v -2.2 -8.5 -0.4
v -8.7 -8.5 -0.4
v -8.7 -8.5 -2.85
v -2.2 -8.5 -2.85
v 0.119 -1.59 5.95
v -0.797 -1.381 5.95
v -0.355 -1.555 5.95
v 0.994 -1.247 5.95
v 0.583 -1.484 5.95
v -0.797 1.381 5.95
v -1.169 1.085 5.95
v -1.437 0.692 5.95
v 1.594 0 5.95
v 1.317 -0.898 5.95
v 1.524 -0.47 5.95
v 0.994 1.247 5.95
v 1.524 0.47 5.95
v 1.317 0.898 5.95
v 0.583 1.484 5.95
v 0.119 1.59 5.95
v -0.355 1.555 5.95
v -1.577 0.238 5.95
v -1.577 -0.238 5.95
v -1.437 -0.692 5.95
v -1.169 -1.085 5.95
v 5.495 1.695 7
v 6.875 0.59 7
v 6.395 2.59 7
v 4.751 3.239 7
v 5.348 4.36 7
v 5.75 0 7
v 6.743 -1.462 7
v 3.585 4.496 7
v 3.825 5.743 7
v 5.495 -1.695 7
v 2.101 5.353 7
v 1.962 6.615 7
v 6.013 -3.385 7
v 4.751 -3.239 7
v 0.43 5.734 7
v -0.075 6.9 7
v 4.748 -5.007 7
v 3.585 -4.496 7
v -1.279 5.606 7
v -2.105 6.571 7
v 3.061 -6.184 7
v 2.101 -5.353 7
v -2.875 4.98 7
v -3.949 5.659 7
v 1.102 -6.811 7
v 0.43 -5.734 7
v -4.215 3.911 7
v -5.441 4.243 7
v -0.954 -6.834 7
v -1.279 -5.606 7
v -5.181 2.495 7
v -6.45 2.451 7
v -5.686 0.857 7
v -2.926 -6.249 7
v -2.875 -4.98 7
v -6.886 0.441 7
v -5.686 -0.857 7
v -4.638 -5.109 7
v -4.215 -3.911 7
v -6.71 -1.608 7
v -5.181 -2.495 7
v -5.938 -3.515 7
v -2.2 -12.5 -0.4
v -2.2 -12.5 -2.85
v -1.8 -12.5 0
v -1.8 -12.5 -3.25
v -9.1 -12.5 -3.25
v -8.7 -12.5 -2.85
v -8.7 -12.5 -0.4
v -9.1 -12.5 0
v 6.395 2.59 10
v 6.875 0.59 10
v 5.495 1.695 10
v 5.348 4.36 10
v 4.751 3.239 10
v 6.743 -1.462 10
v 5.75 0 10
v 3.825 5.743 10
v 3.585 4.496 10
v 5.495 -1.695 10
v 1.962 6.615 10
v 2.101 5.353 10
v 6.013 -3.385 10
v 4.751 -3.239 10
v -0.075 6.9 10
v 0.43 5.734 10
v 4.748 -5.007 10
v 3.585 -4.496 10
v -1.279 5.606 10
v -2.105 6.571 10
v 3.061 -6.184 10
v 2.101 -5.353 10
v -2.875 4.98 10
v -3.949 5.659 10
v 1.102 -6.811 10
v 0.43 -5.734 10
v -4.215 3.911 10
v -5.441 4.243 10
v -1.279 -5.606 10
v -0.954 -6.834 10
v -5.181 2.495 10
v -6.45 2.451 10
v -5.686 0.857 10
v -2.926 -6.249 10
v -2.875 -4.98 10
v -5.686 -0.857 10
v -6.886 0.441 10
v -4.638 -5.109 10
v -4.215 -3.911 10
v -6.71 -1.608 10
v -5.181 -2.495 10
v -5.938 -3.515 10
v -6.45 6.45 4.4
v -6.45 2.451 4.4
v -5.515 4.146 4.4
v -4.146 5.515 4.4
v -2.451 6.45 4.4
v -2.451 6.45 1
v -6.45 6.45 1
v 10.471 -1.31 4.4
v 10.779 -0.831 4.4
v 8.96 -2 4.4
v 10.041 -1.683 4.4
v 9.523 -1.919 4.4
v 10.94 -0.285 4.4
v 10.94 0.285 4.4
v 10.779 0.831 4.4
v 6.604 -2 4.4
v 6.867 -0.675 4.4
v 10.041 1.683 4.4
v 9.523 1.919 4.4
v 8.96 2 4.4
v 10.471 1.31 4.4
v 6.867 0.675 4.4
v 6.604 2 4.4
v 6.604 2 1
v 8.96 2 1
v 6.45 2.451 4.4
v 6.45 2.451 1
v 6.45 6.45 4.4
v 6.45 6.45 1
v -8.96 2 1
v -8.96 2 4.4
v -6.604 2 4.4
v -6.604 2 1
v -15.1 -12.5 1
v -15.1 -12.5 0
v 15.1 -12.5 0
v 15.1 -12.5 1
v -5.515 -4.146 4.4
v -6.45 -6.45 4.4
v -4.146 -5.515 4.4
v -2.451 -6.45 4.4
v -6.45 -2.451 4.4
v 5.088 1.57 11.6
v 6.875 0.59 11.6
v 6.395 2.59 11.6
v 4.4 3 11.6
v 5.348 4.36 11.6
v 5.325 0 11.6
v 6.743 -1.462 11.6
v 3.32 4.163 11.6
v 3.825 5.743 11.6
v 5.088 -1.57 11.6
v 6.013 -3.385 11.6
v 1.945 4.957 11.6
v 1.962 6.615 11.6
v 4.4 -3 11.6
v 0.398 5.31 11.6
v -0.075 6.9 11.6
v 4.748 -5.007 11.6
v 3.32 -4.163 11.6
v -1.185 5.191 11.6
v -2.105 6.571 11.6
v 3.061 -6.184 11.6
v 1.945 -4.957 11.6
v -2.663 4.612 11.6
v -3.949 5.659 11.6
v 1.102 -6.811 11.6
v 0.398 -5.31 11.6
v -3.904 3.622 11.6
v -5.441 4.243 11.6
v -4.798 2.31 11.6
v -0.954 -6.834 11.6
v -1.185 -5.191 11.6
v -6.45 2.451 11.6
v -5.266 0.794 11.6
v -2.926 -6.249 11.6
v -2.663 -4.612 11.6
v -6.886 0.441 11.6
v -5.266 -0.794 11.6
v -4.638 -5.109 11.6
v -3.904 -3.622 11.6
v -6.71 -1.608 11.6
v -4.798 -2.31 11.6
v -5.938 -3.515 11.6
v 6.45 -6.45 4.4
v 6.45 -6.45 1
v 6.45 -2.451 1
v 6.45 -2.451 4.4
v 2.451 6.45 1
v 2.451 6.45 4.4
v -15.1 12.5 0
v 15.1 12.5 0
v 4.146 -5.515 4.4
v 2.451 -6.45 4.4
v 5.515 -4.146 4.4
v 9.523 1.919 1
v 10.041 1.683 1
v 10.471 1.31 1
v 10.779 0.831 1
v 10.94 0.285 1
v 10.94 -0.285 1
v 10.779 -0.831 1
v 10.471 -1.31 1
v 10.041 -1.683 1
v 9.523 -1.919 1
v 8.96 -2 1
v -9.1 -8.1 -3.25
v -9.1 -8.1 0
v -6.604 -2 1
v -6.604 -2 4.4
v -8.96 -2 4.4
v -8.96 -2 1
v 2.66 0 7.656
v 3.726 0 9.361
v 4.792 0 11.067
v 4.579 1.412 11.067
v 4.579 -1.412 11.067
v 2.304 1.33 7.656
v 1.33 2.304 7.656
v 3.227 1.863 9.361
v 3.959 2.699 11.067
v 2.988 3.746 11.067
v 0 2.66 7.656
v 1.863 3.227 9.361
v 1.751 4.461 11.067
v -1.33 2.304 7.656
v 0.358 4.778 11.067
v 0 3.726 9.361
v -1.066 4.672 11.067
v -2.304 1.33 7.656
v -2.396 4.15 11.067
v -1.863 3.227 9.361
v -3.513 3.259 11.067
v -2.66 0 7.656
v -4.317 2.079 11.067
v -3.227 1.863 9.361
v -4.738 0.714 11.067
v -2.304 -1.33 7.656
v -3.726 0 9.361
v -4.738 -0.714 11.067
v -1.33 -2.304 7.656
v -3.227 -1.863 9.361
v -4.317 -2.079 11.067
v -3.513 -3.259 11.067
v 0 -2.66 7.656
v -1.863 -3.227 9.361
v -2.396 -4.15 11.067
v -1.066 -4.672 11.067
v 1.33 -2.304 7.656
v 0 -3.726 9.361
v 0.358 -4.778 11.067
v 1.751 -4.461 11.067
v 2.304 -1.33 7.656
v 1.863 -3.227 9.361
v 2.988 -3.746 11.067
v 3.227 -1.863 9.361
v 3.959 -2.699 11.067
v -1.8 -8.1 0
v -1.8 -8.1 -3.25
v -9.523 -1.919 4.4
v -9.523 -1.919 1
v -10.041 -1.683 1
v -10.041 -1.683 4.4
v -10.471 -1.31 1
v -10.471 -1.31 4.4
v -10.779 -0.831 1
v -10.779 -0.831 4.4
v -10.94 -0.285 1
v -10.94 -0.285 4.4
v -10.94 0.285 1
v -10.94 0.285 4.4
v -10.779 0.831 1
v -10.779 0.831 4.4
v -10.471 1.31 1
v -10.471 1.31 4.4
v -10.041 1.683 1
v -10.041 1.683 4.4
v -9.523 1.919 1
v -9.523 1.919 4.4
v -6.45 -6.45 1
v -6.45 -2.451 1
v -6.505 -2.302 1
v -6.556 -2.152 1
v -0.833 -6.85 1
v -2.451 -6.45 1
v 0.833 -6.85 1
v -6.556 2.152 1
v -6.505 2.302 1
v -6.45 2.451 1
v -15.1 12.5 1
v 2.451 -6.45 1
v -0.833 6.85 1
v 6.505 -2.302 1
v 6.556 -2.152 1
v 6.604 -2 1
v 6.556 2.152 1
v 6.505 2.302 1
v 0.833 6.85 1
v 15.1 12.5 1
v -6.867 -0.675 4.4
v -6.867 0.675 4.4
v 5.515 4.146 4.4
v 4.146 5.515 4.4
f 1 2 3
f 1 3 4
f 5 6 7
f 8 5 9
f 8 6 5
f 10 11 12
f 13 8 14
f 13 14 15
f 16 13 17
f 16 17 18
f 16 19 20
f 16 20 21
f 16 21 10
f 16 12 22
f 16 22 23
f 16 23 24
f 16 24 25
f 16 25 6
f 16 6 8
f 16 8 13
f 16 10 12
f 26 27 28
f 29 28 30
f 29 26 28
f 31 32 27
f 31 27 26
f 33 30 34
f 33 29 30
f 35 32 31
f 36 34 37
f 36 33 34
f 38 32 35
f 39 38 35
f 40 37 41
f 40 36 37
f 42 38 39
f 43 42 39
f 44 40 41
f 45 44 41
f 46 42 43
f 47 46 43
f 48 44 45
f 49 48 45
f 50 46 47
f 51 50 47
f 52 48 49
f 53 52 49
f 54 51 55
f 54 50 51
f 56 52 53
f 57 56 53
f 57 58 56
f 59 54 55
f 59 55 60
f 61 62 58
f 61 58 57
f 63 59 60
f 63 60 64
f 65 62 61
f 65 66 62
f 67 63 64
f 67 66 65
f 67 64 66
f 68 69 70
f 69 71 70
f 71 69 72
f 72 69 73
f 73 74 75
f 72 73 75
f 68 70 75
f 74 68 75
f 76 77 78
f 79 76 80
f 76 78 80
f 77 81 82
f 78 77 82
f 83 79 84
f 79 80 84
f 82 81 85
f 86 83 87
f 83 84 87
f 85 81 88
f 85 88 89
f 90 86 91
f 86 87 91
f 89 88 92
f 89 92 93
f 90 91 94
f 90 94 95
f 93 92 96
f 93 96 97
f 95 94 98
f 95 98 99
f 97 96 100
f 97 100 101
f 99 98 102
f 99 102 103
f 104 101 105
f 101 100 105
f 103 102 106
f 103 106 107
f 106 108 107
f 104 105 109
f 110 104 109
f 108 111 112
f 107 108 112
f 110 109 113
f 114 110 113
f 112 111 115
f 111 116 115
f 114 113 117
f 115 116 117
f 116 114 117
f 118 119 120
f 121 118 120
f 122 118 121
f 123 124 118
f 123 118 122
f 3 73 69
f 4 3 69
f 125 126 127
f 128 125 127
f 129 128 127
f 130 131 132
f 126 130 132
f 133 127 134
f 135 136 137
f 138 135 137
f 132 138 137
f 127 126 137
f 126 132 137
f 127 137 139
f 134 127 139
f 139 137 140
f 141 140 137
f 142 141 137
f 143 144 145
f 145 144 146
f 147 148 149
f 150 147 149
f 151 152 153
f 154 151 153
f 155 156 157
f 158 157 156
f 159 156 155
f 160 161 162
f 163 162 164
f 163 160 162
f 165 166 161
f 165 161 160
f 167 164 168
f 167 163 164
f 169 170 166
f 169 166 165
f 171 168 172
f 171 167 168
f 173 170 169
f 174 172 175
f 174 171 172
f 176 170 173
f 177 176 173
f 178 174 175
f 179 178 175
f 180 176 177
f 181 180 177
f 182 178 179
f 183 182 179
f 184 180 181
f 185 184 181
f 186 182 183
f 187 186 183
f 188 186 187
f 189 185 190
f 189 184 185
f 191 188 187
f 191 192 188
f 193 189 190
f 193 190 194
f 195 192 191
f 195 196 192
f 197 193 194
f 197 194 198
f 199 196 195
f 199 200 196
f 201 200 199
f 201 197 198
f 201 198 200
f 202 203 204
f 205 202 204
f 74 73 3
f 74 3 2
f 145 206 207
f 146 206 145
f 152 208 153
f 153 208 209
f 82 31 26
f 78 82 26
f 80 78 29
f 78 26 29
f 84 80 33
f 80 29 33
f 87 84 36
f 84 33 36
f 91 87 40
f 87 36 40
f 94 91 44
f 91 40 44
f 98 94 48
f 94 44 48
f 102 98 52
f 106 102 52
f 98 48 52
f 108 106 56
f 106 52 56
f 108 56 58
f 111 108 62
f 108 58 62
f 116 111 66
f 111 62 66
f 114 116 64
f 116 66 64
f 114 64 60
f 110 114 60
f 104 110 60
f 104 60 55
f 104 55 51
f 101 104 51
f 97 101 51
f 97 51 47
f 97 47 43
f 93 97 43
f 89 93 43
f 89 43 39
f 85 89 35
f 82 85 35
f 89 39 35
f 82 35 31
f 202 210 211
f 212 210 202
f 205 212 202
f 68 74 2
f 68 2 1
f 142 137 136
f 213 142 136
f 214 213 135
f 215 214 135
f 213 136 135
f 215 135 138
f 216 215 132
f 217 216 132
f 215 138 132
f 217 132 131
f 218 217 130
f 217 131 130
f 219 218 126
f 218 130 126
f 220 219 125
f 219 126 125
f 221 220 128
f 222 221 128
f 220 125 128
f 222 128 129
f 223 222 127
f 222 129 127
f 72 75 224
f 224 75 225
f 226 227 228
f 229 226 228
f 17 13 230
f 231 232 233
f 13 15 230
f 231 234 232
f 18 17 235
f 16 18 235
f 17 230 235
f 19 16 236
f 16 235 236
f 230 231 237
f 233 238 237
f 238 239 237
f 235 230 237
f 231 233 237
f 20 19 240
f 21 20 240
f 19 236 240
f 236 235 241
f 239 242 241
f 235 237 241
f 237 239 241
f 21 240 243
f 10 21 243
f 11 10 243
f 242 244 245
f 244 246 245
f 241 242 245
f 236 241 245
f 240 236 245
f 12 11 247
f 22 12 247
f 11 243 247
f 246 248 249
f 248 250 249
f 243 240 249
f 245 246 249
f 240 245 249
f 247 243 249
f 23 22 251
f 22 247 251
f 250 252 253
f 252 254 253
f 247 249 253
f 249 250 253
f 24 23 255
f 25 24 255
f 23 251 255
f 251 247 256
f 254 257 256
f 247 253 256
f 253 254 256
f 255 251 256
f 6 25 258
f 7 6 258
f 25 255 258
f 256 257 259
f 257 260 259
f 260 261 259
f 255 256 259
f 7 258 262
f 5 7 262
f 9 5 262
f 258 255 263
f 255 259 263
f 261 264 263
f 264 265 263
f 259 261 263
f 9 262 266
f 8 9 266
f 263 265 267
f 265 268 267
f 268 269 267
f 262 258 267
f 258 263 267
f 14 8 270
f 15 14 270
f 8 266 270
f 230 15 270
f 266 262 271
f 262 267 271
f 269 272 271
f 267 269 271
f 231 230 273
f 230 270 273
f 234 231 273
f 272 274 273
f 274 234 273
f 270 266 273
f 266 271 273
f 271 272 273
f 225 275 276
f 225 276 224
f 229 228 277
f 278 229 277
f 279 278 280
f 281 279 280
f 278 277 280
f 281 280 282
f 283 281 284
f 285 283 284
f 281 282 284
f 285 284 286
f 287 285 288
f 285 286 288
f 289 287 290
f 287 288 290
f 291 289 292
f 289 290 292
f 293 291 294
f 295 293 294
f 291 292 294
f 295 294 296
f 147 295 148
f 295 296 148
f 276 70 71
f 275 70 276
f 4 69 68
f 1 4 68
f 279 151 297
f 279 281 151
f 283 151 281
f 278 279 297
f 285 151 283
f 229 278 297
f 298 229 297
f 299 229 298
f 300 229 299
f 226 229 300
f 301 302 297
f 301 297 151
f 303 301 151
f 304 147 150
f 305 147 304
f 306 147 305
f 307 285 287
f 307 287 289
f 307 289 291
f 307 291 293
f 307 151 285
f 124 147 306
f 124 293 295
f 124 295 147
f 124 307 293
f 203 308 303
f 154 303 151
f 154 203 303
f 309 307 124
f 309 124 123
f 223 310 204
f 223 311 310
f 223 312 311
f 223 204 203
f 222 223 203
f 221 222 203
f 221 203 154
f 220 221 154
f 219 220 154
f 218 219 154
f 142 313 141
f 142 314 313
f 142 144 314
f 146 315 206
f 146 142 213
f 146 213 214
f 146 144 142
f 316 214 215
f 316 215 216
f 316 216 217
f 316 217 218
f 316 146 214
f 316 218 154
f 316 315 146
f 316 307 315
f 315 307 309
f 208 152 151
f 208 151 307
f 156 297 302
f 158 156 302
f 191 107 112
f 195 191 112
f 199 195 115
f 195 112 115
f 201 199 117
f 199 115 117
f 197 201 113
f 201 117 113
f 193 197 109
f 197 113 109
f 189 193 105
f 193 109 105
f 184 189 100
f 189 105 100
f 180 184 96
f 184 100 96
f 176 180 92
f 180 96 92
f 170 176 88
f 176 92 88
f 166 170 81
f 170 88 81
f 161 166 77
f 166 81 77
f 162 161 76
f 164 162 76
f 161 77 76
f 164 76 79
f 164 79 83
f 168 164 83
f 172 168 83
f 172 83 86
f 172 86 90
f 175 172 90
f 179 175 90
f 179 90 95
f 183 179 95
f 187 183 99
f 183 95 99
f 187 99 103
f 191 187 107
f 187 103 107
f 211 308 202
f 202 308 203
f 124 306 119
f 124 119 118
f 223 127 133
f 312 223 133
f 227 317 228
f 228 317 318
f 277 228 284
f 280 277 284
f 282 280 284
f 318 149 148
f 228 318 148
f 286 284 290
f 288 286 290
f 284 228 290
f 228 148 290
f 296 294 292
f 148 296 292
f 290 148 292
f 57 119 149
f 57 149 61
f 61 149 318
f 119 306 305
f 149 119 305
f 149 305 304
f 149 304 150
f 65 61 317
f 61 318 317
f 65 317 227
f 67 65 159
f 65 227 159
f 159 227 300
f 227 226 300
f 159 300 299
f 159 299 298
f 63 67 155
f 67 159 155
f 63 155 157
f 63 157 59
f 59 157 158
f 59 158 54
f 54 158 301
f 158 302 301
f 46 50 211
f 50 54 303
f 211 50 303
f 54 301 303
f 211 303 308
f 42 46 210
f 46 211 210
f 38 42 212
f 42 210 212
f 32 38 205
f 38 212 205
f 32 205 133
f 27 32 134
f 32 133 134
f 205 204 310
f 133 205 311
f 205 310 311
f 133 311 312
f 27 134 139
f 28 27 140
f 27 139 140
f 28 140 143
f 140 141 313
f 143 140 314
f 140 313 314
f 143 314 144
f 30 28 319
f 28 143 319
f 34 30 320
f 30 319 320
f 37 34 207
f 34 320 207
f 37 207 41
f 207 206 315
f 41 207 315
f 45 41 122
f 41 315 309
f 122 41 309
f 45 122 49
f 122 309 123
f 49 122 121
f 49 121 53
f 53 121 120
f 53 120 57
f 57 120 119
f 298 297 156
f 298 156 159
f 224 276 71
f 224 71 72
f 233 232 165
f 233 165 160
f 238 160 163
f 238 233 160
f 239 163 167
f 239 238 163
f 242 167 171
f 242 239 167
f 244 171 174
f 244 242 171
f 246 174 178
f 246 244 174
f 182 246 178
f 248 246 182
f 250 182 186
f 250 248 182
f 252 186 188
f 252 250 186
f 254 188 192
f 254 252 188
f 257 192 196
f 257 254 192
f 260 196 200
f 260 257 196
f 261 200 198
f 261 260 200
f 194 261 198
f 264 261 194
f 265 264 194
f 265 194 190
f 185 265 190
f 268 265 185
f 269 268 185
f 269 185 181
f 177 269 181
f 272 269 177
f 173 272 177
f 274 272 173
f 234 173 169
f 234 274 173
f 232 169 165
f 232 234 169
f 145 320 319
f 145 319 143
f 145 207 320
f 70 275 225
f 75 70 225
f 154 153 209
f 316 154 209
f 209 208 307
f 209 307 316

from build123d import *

# Parameters (mm, degrees)
SKETCH1_W           = 30.2
SKETCH1_H           = 25
BOSS_EXTRUDE1_DEPTH = 1
SKETCH2_W           = 12.9
SKETCH2_H           = 12.9
BOSS_EXTRUDE2_DEPTH = 3.4
SKETCH3_R           = 6.9
BOSS_EXTRUDE3_DEPTH = 6
SKETCH4_R           = 5.75
BOSS_EXTRUDE4_DEPTH = 3
SKETCH5_R           = 6.9
BOSS_EXTRUDE5_DEPTH = 1.6
SKETCH6_R           = 5.125
CUT_EXTRUDE1_DEPTH  = 5.65
CUT_EXTRUDE1_DRAFT  = -32
CHAMFER1_SIZE       = 0.2
CHAMFER1_SIZE2      = 0.628676121
SKETCH7_W           = 7.3
SKETCH7_H           = 4.4
BOSS_EXTRUDE6_DEPTH = 3.25
SKETCH8_W           = 6.5
SKETCH8_H           = 2.45
CUT_EXTRUDE2_DEPTH  = 4
BOSS_EXTRUDE7_DEPTH = 3.4


with BuildPart() as part:
    # Sketch1 → Boss-Extrude1 (new body)
    with BuildSketch(Plane.XY):
        Rectangle(SKETCH1_W, SKETCH1_H)
    extrude(amount=BOSS_EXTRUDE1_DEPTH)

    # Sketch2 → Boss-Extrude2 (add)
    with BuildSketch(Plane.XY.offset(1)):
        Rectangle(SKETCH2_W, SKETCH2_H)
    extrude(amount=BOSS_EXTRUDE2_DEPTH)

    # Sketch3 → Boss-Extrude3 (add)
    with BuildSketch(Plane.XY.offset(1)):
        with Locations(Location((0, 0, 0), (0, 0, 159.193052224))):
            Circle(SKETCH3_R)
    extrude(amount=BOSS_EXTRUDE3_DEPTH)

    # Sketch4 → Boss-Extrude4 (add)
    with BuildSketch(Plane.XY.offset(7)):
        Circle(SKETCH4_R)
    extrude(amount=BOSS_EXTRUDE4_DEPTH)

    # Sketch5 → Boss-Extrude5 (add)
    with BuildSketch(Plane.XY.offset(10)):
        with Locations(Location((0, 0, 0), (0, 0, 159.193052224))):
            Circle(SKETCH5_R)
    extrude(amount=BOSS_EXTRUDE5_DEPTH)


with BuildPart() as cut_extrude1_tool:
    # Sketch6 → Cut-Extrude1 (with draft: the straight prism first)
    with BuildSketch(Plane.XY.offset(11.6)):
        Circle(SKETCH6_R)
    extrude(amount=-CUT_EXTRUDE1_DEPTH)
    # Cut-Extrude1: the draft: its side faces are tilted about the plane it starts from
    cut_extrude1_sides = [cut_extrude1_tool.faces().sort_by_distance(p)[0] for p in [
        (-5.125, 0, 8.775),
    ]]
    draft(cut_extrude1_sides, Plane.XY.offset(11.6), CUT_EXTRUDE1_DRAFT)


with BuildPart() as part_1:
    add(part.part)

    # Cut-Extrude1: cut by cut_extrude1_tool
    add(cut_extrude1_tool.part, mode=Mode.SUBTRACT)

    # Chamfer1
    chamfer1_edges = [part_1.edges().sort_by_distance(p)[0] for p in [
        (-5.125, 0, 11.6),
    ]]
    chamfer1_side = [part_1.faces().sort_by_distance(p)[0] for p in [
        (6.26756645, -2.381694876, 11.6),
    ]]
    chamfer(chamfer1_edges, length=CHAMFER1_SIZE, length2=CHAMFER1_SIZE2, reference=chamfer1_side[0])

    # Sketch9 → Boss-Extrude7 (add)
    with BuildSketch(Plane.XY.offset(4.4)):
        with BuildLine():
            Line((8.96, -2), (-8.96, -2))
            ThreePointArc((-8.96, -2), (-10.96, 0), (-8.96, 2))
            Line((-8.96, 2), (8.96, 2))
            ThreePointArc((8.96, 2), (10.96, 0), (8.96, -2))
        make_face()
    extrude(amount=-BOSS_EXTRUDE7_DEPTH)


with BuildPart() as body_2:
    # Sketch7 → Boss-Extrude6 (new body)
    with BuildSketch(Plane(origin=(0, 0, 0), x_dir=(-1, 0, 0), z_dir=(0, 0, -1))):
        with Locations((5.45, -10.3)):
            Rectangle(SKETCH7_W, SKETCH7_H)
    extrude(amount=BOSS_EXTRUDE6_DEPTH)

    # Sketch8 → Cut-Extrude2 (cut)
    with BuildSketch(Plane.XZ.offset(12.5)):
        with Locations((-5.45, -1.625)):
            Rectangle(SKETCH8_W, SKETCH8_H)
    extrude(amount=-CUT_EXTRUDE2_DEPTH, mode=Mode.SUBTRACT)


solid = Compound([part_1.part, body_2.part])
